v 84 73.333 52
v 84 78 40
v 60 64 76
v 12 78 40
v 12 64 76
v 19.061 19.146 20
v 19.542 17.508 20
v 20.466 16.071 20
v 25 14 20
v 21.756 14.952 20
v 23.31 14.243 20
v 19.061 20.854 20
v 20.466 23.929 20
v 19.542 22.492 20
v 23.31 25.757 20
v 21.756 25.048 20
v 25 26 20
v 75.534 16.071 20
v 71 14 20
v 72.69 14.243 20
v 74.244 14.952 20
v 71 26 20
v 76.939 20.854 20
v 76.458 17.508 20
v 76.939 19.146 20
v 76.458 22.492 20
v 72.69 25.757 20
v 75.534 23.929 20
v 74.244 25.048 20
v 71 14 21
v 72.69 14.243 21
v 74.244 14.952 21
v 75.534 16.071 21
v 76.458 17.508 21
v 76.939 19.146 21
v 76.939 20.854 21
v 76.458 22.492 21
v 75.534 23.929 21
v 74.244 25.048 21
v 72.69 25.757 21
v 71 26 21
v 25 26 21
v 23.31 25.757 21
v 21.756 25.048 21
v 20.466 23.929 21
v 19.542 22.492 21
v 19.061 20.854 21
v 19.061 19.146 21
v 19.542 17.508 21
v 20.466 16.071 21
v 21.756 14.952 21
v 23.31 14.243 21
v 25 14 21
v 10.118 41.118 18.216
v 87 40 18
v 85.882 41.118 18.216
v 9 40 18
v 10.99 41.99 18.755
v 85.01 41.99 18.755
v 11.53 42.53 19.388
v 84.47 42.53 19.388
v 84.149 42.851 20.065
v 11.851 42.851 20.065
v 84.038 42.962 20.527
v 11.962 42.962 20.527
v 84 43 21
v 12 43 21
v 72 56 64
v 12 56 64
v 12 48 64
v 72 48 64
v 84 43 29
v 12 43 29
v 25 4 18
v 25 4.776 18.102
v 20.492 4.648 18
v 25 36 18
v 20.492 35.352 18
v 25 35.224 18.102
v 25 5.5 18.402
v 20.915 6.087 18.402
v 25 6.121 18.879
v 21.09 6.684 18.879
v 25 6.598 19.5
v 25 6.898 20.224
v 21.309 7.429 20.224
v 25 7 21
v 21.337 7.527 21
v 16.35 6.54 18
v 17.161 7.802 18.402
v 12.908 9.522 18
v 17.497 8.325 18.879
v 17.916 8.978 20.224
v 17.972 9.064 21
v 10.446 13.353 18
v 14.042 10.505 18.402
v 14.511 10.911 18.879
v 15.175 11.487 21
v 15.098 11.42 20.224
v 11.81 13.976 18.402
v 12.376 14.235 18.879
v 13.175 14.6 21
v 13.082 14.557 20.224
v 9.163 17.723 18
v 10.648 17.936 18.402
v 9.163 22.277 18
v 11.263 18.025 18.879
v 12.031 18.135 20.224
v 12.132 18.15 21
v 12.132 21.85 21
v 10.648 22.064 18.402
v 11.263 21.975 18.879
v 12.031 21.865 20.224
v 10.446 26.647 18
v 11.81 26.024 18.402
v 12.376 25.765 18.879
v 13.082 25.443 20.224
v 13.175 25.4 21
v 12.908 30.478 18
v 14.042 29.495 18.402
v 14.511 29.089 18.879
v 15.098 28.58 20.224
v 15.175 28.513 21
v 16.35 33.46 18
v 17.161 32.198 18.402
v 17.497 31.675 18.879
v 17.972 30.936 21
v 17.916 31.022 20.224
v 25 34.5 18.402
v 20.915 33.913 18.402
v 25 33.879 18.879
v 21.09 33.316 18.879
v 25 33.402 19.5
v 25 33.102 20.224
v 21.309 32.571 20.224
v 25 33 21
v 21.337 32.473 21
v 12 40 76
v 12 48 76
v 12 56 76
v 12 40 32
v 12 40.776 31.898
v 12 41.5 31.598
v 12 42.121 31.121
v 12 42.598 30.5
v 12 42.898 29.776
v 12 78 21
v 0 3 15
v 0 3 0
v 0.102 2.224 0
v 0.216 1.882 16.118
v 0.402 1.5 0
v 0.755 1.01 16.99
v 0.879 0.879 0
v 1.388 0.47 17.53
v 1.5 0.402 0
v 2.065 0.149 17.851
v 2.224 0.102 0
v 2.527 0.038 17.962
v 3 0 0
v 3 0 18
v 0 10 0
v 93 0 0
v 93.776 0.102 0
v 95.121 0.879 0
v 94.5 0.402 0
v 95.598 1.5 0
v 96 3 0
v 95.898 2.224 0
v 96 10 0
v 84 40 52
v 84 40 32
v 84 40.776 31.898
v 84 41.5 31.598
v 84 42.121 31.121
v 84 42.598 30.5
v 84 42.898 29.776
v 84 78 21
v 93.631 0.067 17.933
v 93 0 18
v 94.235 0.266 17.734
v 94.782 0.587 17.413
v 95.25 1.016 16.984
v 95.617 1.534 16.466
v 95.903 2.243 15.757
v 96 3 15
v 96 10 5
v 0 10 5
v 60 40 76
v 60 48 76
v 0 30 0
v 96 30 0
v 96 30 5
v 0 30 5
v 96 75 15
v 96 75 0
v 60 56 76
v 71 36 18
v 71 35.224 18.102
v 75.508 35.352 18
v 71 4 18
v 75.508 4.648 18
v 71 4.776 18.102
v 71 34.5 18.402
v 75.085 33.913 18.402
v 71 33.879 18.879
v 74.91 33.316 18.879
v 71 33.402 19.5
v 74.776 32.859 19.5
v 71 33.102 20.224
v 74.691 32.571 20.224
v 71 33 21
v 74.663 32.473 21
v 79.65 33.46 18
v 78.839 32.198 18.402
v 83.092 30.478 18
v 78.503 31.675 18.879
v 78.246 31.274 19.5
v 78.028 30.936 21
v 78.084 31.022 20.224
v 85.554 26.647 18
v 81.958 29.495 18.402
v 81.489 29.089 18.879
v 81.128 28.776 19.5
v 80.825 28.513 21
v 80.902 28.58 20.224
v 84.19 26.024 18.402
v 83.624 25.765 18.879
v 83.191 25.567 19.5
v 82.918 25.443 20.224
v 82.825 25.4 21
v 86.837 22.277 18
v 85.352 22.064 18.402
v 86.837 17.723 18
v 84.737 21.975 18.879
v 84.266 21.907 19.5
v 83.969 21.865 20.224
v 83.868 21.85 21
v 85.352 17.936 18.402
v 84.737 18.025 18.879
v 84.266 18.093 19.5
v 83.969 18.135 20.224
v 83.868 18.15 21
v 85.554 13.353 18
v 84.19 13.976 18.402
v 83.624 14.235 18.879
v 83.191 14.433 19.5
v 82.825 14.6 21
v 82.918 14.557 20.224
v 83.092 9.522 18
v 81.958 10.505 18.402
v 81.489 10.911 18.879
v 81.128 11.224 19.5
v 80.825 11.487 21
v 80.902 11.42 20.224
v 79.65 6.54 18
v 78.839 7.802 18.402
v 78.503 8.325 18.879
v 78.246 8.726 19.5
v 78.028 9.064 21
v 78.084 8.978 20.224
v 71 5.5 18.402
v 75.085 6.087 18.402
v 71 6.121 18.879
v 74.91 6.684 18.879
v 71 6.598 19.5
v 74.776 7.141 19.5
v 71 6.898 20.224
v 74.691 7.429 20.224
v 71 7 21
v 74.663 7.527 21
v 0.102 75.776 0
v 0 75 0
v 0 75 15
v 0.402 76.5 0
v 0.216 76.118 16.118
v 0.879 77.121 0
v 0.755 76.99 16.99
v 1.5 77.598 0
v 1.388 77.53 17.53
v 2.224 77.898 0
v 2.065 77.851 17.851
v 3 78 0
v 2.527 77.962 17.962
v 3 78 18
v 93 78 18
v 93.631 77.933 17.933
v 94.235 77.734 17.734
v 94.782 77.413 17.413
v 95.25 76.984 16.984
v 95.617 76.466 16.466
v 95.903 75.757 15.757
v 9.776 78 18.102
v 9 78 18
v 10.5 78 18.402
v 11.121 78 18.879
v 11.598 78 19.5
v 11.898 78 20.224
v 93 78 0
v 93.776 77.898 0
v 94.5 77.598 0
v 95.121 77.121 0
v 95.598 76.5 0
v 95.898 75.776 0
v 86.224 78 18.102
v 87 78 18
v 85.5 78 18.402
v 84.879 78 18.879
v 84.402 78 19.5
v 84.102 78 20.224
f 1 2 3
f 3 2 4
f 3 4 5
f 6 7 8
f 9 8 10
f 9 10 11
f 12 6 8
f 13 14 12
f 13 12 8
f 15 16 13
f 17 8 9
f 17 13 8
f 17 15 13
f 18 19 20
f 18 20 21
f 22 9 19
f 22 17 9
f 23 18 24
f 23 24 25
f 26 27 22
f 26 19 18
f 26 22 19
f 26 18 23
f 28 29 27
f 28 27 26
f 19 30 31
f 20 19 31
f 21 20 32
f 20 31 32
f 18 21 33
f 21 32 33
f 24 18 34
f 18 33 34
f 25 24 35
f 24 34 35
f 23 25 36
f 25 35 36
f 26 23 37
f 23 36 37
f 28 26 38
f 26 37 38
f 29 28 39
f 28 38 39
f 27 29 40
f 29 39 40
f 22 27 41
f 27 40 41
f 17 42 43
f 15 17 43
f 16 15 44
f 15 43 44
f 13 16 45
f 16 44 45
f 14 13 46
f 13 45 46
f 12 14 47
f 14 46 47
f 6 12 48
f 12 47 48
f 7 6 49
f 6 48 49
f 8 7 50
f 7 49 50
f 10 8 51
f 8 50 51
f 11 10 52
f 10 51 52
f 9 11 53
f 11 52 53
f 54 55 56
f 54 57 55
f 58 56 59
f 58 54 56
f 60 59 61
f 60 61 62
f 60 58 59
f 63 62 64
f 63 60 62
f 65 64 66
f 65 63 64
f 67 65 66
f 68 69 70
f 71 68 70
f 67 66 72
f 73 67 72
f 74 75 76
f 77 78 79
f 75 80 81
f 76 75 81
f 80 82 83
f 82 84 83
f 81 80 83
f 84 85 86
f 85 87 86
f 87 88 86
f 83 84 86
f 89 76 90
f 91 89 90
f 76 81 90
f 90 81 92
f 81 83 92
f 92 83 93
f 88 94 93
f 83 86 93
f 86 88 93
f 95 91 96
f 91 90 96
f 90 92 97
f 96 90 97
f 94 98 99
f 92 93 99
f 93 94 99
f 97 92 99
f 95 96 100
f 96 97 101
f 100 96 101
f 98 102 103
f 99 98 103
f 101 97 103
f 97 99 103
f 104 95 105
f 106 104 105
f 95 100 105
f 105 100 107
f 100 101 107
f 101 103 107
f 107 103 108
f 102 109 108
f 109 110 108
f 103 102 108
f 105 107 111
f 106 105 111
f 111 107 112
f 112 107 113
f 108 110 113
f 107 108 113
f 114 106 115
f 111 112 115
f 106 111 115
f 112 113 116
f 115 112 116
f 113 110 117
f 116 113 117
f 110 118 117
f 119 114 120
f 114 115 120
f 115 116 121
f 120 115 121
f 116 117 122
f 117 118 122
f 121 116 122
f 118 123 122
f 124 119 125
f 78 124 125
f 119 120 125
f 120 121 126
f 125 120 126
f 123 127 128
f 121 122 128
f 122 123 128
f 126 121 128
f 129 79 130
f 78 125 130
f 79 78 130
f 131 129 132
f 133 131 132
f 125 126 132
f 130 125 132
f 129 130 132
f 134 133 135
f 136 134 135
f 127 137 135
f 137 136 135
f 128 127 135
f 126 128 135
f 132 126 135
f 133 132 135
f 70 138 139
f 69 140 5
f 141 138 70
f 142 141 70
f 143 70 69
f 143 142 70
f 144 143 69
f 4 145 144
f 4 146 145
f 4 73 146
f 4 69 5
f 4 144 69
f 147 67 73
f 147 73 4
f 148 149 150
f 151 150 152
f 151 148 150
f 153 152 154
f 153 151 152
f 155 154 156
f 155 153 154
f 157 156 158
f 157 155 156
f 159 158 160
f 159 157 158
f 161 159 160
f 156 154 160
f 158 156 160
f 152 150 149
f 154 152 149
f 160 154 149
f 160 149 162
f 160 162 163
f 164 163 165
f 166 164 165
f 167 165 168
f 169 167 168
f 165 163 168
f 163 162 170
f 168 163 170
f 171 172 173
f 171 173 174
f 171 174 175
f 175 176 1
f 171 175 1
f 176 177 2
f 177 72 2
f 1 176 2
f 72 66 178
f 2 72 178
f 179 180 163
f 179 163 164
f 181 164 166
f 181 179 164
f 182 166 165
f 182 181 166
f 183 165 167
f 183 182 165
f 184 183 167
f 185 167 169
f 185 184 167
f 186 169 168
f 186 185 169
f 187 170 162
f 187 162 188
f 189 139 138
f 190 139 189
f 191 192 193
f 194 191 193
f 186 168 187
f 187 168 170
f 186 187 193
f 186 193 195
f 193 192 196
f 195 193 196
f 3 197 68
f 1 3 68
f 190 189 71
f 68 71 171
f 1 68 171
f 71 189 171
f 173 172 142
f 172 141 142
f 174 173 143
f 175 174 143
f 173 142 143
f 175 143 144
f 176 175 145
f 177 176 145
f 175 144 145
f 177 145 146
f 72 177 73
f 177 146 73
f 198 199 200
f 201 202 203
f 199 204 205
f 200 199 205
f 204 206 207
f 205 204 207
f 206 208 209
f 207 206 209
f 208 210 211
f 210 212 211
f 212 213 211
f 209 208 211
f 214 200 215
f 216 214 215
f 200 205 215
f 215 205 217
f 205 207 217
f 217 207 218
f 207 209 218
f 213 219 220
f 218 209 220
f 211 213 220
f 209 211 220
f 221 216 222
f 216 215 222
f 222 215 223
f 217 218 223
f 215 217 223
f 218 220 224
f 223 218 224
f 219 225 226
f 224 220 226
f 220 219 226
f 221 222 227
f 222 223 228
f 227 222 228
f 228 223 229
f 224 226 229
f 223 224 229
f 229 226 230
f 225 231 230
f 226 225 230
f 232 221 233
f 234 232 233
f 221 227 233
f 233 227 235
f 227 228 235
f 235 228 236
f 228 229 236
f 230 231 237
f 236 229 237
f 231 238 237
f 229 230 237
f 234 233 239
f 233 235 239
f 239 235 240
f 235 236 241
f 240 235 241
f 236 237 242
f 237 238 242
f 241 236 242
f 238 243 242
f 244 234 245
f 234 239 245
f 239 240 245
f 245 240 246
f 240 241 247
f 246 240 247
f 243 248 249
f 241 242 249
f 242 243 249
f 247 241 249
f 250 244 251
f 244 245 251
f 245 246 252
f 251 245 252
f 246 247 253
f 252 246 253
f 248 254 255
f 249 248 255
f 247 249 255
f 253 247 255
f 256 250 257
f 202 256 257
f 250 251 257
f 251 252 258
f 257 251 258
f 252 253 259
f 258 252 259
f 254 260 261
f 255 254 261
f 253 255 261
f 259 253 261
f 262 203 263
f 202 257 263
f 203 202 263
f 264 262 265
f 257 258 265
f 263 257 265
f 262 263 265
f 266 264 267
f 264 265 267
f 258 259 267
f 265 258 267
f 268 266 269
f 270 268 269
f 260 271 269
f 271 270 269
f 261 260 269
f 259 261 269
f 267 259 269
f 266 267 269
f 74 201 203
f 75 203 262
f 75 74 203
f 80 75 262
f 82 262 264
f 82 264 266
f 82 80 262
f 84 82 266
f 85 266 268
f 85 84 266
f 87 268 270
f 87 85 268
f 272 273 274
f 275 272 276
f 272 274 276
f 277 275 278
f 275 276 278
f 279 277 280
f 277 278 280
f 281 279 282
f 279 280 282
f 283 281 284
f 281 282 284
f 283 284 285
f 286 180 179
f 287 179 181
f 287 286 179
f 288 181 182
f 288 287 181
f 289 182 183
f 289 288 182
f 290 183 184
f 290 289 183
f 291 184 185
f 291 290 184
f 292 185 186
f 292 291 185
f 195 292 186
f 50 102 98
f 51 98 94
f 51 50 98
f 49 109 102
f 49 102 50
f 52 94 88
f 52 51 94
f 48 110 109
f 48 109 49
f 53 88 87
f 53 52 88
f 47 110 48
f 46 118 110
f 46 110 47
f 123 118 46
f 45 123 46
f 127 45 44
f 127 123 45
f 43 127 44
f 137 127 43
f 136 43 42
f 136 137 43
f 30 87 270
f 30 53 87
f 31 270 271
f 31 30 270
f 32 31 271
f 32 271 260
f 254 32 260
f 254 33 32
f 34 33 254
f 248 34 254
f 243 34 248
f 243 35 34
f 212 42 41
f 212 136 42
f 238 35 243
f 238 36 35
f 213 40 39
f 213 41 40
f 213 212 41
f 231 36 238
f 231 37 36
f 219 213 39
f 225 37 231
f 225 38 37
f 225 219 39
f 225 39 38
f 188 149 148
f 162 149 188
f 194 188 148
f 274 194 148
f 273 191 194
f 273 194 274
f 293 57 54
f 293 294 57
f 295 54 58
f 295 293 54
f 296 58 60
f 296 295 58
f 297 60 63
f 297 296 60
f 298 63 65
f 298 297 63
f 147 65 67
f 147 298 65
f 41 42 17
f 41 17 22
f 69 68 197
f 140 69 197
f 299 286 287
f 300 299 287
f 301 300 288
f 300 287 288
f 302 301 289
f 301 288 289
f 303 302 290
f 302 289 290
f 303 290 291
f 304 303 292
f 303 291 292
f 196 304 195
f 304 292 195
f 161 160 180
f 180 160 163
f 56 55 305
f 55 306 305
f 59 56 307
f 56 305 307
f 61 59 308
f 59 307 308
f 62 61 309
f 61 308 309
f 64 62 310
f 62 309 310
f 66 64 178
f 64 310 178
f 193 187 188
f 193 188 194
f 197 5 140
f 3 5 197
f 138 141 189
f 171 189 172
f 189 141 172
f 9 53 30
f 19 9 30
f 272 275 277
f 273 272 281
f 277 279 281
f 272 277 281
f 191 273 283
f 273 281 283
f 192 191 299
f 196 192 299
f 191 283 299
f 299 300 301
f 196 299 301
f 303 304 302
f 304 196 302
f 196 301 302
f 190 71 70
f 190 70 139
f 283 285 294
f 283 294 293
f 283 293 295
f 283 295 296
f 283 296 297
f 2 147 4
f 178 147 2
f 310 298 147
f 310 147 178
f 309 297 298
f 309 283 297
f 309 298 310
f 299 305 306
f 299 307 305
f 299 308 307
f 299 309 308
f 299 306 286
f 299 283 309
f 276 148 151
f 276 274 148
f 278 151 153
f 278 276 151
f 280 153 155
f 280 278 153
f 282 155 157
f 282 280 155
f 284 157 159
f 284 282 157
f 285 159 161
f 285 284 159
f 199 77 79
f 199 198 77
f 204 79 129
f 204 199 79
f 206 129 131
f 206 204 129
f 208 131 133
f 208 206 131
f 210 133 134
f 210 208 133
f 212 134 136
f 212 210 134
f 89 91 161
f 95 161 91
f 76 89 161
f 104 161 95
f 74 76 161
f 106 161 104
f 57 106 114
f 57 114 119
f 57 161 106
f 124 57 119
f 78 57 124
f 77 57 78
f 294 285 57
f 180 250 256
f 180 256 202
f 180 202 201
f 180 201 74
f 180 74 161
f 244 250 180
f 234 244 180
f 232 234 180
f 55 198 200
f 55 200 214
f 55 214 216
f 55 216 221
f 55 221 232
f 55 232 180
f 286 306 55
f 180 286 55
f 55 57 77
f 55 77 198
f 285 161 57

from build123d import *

# Parameters (mm, degrees)
F0_W      = 96
F0_H      = 78
F1_DEPTH  = 18
F3_W      = 72
F3_H      = 38
F5_DEPTH  = 58
F7_DEPTH  = 38
F8_W      = 8
F8_H      = 12
F9_DEPTH  = 60.001
F11_DEPTH = 72.001
F12_W     = 20
F12_H     = 5
F13_DEPTH = 96.001
F14_W     = 46
F14_H     = 26
F15_DEPTH = 3
F16_W     = 46
F16_H     = 12
F17_DEPTH = 1
F18_W     = 3
F18_H     = 14
F19_DEPTH = 72
F20_R     = 2.99999


# Not quite as in the source:
# - a fillet or chamfer is up to 0.001 mm smaller than in the source, because OpenCascade refuses the exact size


with BuildPart() as f1:
    # F0 (on Top) → F1 (new body)
    with BuildSketch(Plane.XY):
        with Locations((48, 39)):
            Rectangle(F0_W, F0_H)
    extrude(amount=F1_DEPTH)

    # F3 (on face) → F5 (join, through all)
    with BuildSketch(Plane.XY.offset(18)):
        with Locations((48, 59)):
            Rectangle(F3_W, F3_H)
    extrude(amount=F5_DEPTH)

    # F6 (on face) → F7 (cut, through all)
    with BuildSketch(Plane.XZ.offset(-40)):
        Polygon((84, 76), (60, 76), (84, 52), align=None)
    extrude(amount=-F7_DEPTH, mode=Mode.SUBTRACT)

    # F8 (on face) → F9 (cut, through all)
    with BuildSketch(Plane(origin=(12, 0, 0), x_dir=(0, -1, 0), z_dir=(-1, 0, 0))):
        with Locations((-52, 70)):
            Rectangle(F8_W, F8_H)
    extrude(amount=-F9_DEPTH, mode=Mode.SUBTRACT)

    # F10 (on face) → F11 (cut, through all)
    with BuildSketch(Plane(origin=(12, 0, 0), x_dir=(0, -1, 0), z_dir=(-1, 0, 0))):
        Polygon((-64, 76), (-78, 76), (-78, 40), align=None)
    extrude(amount=-F11_DEPTH, mode=Mode.SUBTRACT)

    # F12 (on face) → F13 (cut, through all)
    with BuildSketch(Plane.YZ.offset(96)):
        with Locations((20, 2.5)):
            Rectangle(F12_W, F12_H)
    extrude(amount=-F13_DEPTH, mode=Mode.SUBTRACT)

    # F14 (on face) → F15 (join)
    with BuildSketch(Plane.XY.offset(18)):
        with Locations((48, 19.9999999999)):
            Rectangle(F14_W, F14_H)
        with BuildLine():
            Line((25, 6.9999999999), (25, 32.9999999999))
            ThreePointArc((25, 32.9999999999), (12, 19.9999999999), (25, 6.9999999999))
        make_face()
        with BuildLine():
            ThreePointArc((71, 6.9999999999), (84, 19.9999999999), (71, 32.9999999999))
            Line((71, 32.9999999999), (71, 6.9999999999))
        make_face()
    extrude(amount=F15_DEPTH)

    # F16 (on face) → F17 (cut, through all)
    with BuildSketch(Plane.XY.offset(21)):
        with Locations((48, 19.9999999999)):
            Rectangle(F16_W, F16_H)
        with BuildLine():
            Line((25, 13.9999999999), (25, 25.9999999999))
            ThreePointArc((25, 25.9999999999), (19, 19.9999999999), (25, 13.9999999999))
        make_face()
        with BuildLine():
            ThreePointArc((71, 13.9999999999), (77, 19.9999999999), (71, 25.9999999999))
            Line((71, 25.9999999999), (71, 13.9999999999))
        make_face()
    extrude(amount=-F17_DEPTH, mode=Mode.SUBTRACT)

    # F18 (on face) → F19 (cut, through all)
    with BuildSketch(Plane.YZ.offset(84)):
        with Locations((41.5, 25)):
            Rectangle(F18_W, F18_H)
    extrude(amount=-F19_DEPTH, mode=Mode.SUBTRACT)

    # F20 (radius 3 in the source; OpenCascade refuses exactly that, so slightly less here)
    f20_edges = [f1.edges().sort_by_distance(p)[0] for p in [
        (48, 43, 32),
        (48, 43, 18),
        (48, 33, 18),
        (48, 7, 18),
        (96, 39, 18),
        (0, 39, 18),
        (84, 60.5, 18),
        (12, 60.5, 18),
        (96, 0, 9),
        (0, 0, 9),
        (0, 78, 9),
        (96, 78, 9),
    ]]
    fillet(f20_edges, radius=F20_R)


solid = f1.part
